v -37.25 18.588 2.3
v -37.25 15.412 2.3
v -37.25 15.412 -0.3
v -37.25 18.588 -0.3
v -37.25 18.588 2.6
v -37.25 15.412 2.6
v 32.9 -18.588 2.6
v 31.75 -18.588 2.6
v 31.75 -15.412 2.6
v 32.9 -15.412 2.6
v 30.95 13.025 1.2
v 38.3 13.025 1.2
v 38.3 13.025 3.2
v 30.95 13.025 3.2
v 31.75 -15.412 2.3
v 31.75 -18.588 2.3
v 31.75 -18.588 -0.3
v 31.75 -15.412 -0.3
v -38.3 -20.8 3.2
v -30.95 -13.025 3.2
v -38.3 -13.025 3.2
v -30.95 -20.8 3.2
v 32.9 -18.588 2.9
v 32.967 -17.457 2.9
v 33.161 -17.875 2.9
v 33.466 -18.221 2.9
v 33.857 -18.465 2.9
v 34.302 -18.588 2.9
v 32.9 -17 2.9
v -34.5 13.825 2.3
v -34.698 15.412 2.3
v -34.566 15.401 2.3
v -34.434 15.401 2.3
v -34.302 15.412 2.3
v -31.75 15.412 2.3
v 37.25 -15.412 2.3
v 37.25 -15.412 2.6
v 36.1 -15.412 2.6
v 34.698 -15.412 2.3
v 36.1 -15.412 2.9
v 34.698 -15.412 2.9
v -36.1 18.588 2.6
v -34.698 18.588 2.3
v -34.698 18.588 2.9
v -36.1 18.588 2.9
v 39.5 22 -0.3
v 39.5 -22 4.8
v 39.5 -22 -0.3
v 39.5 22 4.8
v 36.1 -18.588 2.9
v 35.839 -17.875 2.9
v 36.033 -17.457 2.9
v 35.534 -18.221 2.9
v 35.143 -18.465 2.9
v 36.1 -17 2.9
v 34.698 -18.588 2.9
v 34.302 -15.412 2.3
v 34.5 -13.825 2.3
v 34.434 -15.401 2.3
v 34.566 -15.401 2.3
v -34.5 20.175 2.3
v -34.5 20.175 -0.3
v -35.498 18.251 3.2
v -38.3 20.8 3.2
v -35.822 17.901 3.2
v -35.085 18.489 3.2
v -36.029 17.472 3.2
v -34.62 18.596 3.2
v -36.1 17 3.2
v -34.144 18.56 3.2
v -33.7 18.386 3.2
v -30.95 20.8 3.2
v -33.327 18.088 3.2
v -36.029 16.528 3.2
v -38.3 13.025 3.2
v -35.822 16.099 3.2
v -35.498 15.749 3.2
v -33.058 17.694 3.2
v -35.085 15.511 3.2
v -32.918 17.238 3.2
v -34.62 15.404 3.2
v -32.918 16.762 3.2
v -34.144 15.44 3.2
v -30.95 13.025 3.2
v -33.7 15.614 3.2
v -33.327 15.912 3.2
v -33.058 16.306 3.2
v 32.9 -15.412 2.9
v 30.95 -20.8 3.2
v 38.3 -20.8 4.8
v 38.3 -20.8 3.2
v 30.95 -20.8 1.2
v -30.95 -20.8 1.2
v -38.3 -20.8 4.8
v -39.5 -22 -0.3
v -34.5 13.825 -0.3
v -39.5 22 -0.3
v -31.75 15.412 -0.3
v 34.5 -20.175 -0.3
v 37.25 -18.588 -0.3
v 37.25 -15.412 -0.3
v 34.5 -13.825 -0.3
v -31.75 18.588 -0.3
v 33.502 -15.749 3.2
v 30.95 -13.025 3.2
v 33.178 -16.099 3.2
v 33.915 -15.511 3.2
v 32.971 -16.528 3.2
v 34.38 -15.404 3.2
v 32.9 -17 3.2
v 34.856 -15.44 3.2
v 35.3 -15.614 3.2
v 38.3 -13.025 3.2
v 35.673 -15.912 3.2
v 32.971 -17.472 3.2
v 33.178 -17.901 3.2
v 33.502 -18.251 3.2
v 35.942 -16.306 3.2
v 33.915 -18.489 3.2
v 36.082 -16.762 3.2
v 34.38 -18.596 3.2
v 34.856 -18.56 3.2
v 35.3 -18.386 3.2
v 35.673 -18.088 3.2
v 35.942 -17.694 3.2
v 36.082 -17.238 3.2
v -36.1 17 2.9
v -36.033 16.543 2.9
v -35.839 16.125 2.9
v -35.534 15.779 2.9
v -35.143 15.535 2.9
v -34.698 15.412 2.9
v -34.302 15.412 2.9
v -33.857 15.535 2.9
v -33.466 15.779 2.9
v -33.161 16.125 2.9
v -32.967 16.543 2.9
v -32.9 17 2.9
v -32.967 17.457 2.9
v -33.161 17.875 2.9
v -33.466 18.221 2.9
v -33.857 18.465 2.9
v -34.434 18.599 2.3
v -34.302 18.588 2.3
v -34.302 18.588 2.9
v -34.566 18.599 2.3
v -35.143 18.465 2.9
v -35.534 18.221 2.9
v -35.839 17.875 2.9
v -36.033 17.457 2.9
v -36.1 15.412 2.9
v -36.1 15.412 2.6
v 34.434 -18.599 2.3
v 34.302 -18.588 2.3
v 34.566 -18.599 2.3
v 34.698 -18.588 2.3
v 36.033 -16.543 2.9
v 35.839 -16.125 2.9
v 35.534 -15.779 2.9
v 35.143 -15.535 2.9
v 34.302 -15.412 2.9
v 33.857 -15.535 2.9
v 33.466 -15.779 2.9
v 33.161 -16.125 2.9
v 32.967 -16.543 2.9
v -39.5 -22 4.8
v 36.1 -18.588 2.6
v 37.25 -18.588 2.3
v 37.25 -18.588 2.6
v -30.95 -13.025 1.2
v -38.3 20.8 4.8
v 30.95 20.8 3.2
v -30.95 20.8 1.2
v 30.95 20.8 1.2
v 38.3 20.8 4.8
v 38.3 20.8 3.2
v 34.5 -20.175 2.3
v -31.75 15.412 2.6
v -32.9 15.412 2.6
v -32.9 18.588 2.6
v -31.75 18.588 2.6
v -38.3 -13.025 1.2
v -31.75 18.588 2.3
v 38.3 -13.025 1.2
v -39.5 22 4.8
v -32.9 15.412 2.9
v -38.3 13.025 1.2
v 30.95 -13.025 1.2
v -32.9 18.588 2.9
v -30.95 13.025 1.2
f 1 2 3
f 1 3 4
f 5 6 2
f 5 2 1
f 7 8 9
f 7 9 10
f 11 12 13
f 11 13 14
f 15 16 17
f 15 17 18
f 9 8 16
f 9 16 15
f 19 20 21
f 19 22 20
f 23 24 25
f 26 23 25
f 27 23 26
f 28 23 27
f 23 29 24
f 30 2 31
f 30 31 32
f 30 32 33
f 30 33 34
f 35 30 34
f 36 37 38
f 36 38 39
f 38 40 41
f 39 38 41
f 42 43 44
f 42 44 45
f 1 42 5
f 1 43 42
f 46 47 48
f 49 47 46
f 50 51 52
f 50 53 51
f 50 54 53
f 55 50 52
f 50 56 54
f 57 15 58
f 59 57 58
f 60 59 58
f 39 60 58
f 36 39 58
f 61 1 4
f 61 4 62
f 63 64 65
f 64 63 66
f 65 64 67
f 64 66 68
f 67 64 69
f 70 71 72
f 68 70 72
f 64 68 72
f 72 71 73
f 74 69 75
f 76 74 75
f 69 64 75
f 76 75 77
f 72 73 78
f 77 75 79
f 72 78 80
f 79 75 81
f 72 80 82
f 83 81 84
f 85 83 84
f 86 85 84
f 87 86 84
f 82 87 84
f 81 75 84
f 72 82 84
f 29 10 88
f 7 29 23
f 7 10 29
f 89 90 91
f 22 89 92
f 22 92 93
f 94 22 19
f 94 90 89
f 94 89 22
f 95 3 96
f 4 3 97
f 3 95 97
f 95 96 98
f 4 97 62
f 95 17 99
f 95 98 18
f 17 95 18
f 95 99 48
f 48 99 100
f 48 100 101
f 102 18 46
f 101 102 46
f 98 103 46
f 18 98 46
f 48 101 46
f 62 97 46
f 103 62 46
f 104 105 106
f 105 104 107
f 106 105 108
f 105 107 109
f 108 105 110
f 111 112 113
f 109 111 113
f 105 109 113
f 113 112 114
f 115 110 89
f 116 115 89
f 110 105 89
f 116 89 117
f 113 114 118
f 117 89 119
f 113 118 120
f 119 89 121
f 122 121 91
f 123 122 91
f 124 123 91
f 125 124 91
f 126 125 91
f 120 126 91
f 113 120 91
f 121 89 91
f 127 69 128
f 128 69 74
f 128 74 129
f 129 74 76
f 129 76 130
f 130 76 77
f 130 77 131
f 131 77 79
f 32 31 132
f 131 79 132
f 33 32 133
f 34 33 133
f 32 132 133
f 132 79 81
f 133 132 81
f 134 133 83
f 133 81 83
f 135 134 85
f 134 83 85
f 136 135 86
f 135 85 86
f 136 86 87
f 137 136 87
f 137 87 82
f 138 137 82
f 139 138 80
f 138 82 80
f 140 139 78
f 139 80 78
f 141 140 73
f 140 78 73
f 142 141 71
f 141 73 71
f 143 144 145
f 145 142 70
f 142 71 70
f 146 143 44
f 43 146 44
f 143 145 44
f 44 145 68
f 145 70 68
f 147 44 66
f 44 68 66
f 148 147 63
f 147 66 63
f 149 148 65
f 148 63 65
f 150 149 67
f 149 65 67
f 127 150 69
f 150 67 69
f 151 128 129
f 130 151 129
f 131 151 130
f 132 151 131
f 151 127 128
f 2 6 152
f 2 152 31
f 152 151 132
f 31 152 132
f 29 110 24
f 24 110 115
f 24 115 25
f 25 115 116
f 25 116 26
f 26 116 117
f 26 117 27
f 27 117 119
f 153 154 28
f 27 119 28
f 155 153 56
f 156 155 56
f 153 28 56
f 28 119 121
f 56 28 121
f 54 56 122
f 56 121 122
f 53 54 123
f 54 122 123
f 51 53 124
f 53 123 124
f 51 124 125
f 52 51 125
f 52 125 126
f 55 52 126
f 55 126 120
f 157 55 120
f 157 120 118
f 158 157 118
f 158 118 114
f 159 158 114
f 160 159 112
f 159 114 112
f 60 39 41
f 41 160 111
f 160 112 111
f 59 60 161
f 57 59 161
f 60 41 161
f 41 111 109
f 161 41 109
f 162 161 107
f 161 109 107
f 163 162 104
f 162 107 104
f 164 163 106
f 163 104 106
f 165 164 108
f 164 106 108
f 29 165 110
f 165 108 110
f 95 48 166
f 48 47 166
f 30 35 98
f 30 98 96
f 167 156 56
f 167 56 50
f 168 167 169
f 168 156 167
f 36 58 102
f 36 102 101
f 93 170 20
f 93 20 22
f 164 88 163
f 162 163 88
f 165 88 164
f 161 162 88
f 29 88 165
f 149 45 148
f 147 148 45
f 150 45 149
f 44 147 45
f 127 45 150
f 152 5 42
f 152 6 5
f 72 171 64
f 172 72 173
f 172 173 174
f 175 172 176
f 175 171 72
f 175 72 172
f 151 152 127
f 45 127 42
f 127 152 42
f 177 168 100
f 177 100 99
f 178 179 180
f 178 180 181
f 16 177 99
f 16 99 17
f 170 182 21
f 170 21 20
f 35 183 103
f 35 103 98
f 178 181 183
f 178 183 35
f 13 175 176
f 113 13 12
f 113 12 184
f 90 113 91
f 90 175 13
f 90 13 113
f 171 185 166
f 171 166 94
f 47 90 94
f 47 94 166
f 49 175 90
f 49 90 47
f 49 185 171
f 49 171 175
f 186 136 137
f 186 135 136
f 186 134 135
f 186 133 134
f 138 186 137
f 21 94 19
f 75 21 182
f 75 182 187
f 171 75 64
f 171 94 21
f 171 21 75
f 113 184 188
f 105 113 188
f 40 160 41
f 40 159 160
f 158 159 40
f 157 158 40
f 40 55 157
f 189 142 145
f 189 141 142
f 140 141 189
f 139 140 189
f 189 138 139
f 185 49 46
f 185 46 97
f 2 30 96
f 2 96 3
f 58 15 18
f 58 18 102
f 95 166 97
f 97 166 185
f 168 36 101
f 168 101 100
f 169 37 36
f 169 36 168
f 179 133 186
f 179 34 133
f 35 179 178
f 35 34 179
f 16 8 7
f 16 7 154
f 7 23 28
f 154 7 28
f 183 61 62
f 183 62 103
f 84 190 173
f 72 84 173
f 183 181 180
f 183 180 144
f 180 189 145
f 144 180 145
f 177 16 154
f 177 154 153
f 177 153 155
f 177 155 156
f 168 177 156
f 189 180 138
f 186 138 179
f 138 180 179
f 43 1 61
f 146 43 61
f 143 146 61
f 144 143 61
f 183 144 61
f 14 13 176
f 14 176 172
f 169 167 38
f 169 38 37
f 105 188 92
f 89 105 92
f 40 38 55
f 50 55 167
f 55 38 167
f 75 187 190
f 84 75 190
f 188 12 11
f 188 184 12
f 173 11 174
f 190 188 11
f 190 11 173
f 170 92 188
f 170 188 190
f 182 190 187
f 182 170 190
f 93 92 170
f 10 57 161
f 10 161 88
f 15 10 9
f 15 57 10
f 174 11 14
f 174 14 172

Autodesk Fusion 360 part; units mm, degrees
sketch "Sketch1" plane through (0, 0, 0) normal (0, 0, 1) x (1, 0, 0)
  line L0 (-39.5, 22) -> (39.5, 22)
  line L1 (39.5, 22) -> (39.5, -22)
  line L2 (39.5, -22) -> (-39.5, -22)
  line L3 (-39.5, -22) -> (-39.5, 22)
  dimension "d1" = 79
  dimension "d2" = 44
  dimension "d3" = 39.5
  dimension "d4" = 22
extrude "Extrude1" add sketch "Sketch1" along normal blind 4.8
sketch "Sketch2" plane through (0, 0, 4.8) normal (0, 0, 1) x (-1, 0, 0)
  line L0 (39.5, 22) -> (-39.5, 22)
  line L1 (-39.5, 22) -> (-39.5, -22)
  line L2 (-39.5, -22) -> (39.5, -22)
  line L3 (39.5, -22) -> (39.5, 22)
  line L4 (38.3, -20.8) -> (-38.3, -20.8)
  line L5 (-38.3, -20.8) -> (-38.3, 20.8)
  line L6 (-38.3, 20.8) -> (38.3, 20.8)
  line L7 (38.3, 20.8) -> (38.3, -20.8)
  dimension "d7" = 76.6
  dimension "d8" = 41.6
  dimension "d9" = 1.2
  dimension "d10" = 1.2
extrude "Extrude2" cut sketch "Sketch2" against normal blind 3.6 contours L4 L5 L6 L7
sketch "Sketch3" plane through (0, 0, 1.2) normal (0, 0, 1) x (-1, 0, 0)
  line L0 (38.3, 20.8) -> (-38.3, 20.8)
  line L1 (-38.3, 20.8) -> (-38.3, -20.8)
  line L2 (-38.3, -20.8) -> (38.3, -20.8)
  line L3 (38.3, -20.8) -> (38.3, 20.8)
  circle A0 centre (-32.9, -15.4) radius 3.25
  line L4 (39.5, -22) -> (-39.5, -22)
  line L5 (-39.5, -22) -> (-39.5, 22)
  line L6 (39.5, 22) -> (39.5, -22)
  line L7 (-39.5, 22) -> (39.5, 22)
  circle A1 centre (32.9, 15.4) radius 3.25
  line L8 (39.5, 22) -> (39.5, -22)
  line L9 (-39.5, 22) -> (39.5, 22)
  dimension "d13" = 6.5
  dimension "d14" = 6.6
  dimension "d15" = 6.6
  dimension "d29" = 6.5
  dimension "d30" = 6.6
  dimension "d31" = 6.6
sketch "Sketch5" plane through (0, 0, 1.2) normal (0, 0, 1) x (1, 0, 0)
extrude "Extrude4" add sketch "Sketch3" along normal blind 2 contours A1
extrude "Extrude5" cut 1 faces at (-34.1709, -16.2087, 3.2) along direction (0, 0, -1) blind 2
sketch "Sketch6" plane through (0, 0, 0) normal (0, 0, -1) x (1, 0, 0)
  line L0 (39.5, 22) -> (-39.5, 22)
  line L1 (-39.5, 22) -> (-39.5, -22)
  line L2 (-39.5, -22) -> (39.5, -22)
  line L3 (39.5, -22) -> (39.5, 22)
  line L4 (-31.75, 15.4123) -> (-31.75, 18.5877)
  line L5 (-31.75, 18.5877) -> (-34.5, 20.1754)
  line L6 (-34.5, 20.1754) -> (-37.25, 18.5877)
  line L7 (-37.25, 18.5877) -> (-37.25, 15.4123)
  line L8 (-37.25, 15.4123) -> (-34.5, 13.8246)
  line L9 (-34.5, 13.8246) -> (-31.75, 15.4123)
  line L10 (-31.35, 22) -> (-31.35, 13.4246)
  line L11 (-31.35, 13.4246) -> (-39.5, 13.4246)
  point P0 (-34.5, 17)
  dimension "d36" = 2.75
  dimension "d37" = 5
  dimension "d38" = 5
  dimension "d50" = 0.4
  dimension "d51" = 0.4
sketch "Sketch9" plane through (0, 0, 0) normal (0, 0, -1) x (1, 0, 0)
  line L0 (-37.25, -15.4123) -> (-37.25, -18.5877)
  line L1 (-37.25, -18.5877) -> (-34.5, -20.1754)
  line L2 (-34.5, -20.1754) -> (-31.75, -18.5877)
  line L3 (-31.75, -18.5877) -> (-31.75, -15.4123)
  line L4 (-31.75, -15.4123) -> (-34.5, -13.8246)
  line L5 (-34.5, -13.8246) -> (-37.25, -15.4123)
  line L6 (-39.5, 22) -> (-39.5, -22)
  line L7 (-39.5, -22) -> (39.5, -22)
  line L8 (-39.5, -13.0246) -> (-30.95, -13.0246)
  line L9 (-30.95, -13.0246) -> (-30.95, -22)
  point P0 (-34.5, -17)
  dimension "d61" = 2.75
  dimension "d62" = 5
  dimension "d63" = 5
  dimension "d64" = 0.8
  dimension "d65" = 0.8
extrude "Extrude11" add sketch "Sketch9" against normal blind 3.2 contours L0 L1 L2 L3 L4 L5 | L6 L7 L8 L9
extrude "Extrude12" cut sketch "Sketch9" against normal blind 2.4 contours L0 L1 L2 L3 L4 L5
sketch "Sketch10" plane through (0, 0, 3.2) normal (0, 0, 1) x (-1, 0, 0)
  line L0 (38.3, -20.8) -> (38.3, -13.0246)
  line L1 (38.3, -13.0246) -> (30.95, -13.0246)
  line L2 (30.95, -13.0246) -> (30.95, -20.8)
  line L3 (30.95, -20.8) -> (38.3, -20.8)
  circle A0 centre (34.5, -17) radius 1.6
  line L4 (39.5, 22) -> (39.5, -22)
  line L5 (39.5, -22) -> (-39.5, -22)
  dimension "d70" = 3.2
  dimension "d71" = 5
  dimension "d72" = 5
extrude "Extrude13" cut sketch "Sketch10" against normal blind 3.2 contours A0
sketch "Sketch11" plane through (0, 0, 0) normal (0, 0, -1) x (1, 0, 0)
  line L0 (37.25, 15.4123) -> (37.25, 18.5877)
  line L1 (37.25, 18.5877) -> (34.5, 20.1754)
  line L2 (34.5, 20.1754) -> (31.75, 18.5877)
  line L3 (31.75, 18.5877) -> (31.75, 15.4123)
  line L4 (31.75, 15.4123) -> (34.5, 13.8246)
  line L5 (34.5, 13.8246) -> (37.25, 15.4123)
  line L6 (39.5, -22) -> (39.5, 22)
  line L7 (39.5, 22) -> (-39.5, 22)
  line L8 (39.5, 13.0246) -> (30.95, 13.0246)
  line L9 (30.95, 13.0246) -> (30.95, 22)
  point P0 (34.5, 17)
  dimension "d75" = 2.75
  dimension "d76" = 5
  dimension "d77" = 5
  dimension "d78" = 0.8
  dimension "d79" = 0.8
extrude "Extrude14" add sketch "Sketch11" against normal blind 3.2 contours L0 L1 L2 L3 L4 L5 | L6 L7 L8 L9
extrude "Extrude15" cut sketch "Sketch11" against normal blind 2.4 contours L0 L1 L2 L3 L4 L5
sketch "Sketch12" plane through (0, 0, 3.2) normal (0, 0, 1) x (-1, 0, 0)
  line L0 (-38.3, 20.8) -> (-38.3, 13.0246)
  line L1 (-38.3, 13.0246) -> (-30.95, 13.0246)
  line L2 (-30.95, 13.0246) -> (-30.95, 20.8)
  line L3 (-30.95, 20.8) -> (-38.3, 20.8)
  circle A0 centre (-34.5, 17) radius 1.6
  line L4 (-39.5, -22) -> (-39.5, 22)
  line L5 (-39.5, 22) -> (39.5, 22)
  dimension "d84" = 3.2
  dimension "d85" = 5
  dimension "d86" = 5
extrude "Extrude16" cut sketch "Sketch12" against normal blind 3.2 contours A0
sketch "Sketch14" plane through (0, 0, 2.4) normal (0, 0, -1) x (1, 0, 0)
  circle A0 centre (-34.5, -17) radius 1.6
  line L0 (-34.5, -13.8246) -> (-37.25, -15.4123)
  line L1 (-37.25, -15.4123) -> (-37.25, -18.5877)
  line L2 (-37.25, -18.5877) -> (-34.5, -20.1754)
  line L3 (-34.5, -20.1754) -> (-31.75, -18.5877)
  line L4 (-31.75, -18.5877) -> (-31.75, -15.4123)
  line L5 (-31.75, -15.4123) -> (-34.5, -13.8246)
  line L6 (-37.25, -15.4123) -> (-31.75, -15.4123)
  line L7 (-31.75, -18.5877) -> (-37.25, -18.5877)
  line L8 (-36.1, -15.4123) -> (-36.1, -18.5877)
  line L9 (-32.9, -18.5877) -> (-32.9, -15.4123)
sketch "Sketch15" plane through (0, 0, 2.4) normal (0, 0, -1) x (1, 0, 0)
  circle A0 centre (34.5, 17) radius 1.6
  line L0 (34.5, 13.8246) -> (37.25, 15.4123)
  line L1 (37.25, 15.4123) -> (37.25, 18.5877)
  line L2 (37.25, 18.5877) -> (34.5, 20.1754)
  line L3 (34.5, 20.1754) -> (31.75, 18.5877)
  line L4 (31.75, 18.5877) -> (31.75, 15.4123)
  line L5 (31.75, 15.4123) -> (34.5, 13.8246)
  line L6 (31.75, 18.5877) -> (37.25, 18.5877)
  line L7 (37.25, 15.4123) -> (31.75, 15.4123)
  line L8 (32.9, 15.4123) -> (32.9, 18.5877)
  line L9 (36.1, 15.4123) -> (36.1, 18.5877)
extrude "Extrude17" cut sketch "Sketch14" sketch "Sketch15" against normal blind 0.5 contours A0 L7 L9 | A0 L6 L9 | A0 L6 L8 | A0 L7 L8 of sketch 2 contours A0 L7 L9 | A0 L6 L9 | A0 L6 L8 | A0 L7 L8
extrude "Extrude18" cut sketch "Sketch14" sketch "Sketch15" against normal blind 0.2 contours L4 L6 L7 L9 | L1 L6 L7 L8 of sketch 2 contours L1 L6 L7 L9 | L4 L6 L7 L8
extrude "Extrude19" add 4 faces at (35.4826, -19.117, 2.4) (35.4826, -14.883, 2.4) (-33.5174, 14.883, 2.4) (-33.5174, 19.117, 2.4) along direction (0, 0, -1) blind 0.1
sketch "Sketch16" plane through (0, 0, 1.2) normal (0, 0, 1) x (-1, 0, 0)
  line L0 (-30.95, 13.0246) -> (-38.3, 13.0246)
  line L1 (-38.3, 13.0246) -> (-38.3, -20.8)
  line L2 (-38.3, -20.8) -> (30.95, -20.8)
  line L3 (30.95, -20.8) -> (30.95, -13.0246)
  line L4 (30.95, -13.0246) -> (38.3, -13.0246)
  line L5 (38.3, -13.0246) -> (38.3, 20.8)
  line L6 (38.3, 20.8) -> (-30.95, 20.8)
  line L7 (-30.95, 20.8) -> (-30.95, 13.0246)
  line L8 (-30.95, -20.8) -> (-38.3, -20.8)
  line L9 (-38.3, -20.8) -> (-38.3, -13.025)
  line L10 (-38.3, -13.025) -> (-30.95, -13.025)
  line L11 (-30.95, -13.025) -> (-30.95, -20.8)
  line L12 (38.3, 20.8) -> (38.3, 13.025)
  line L13 (38.3, 13.025) -> (30.95, 13.025)
  line L14 (30.95, 20.8) -> (38.3, 20.8)
  line L15 (30.95, 13.025) -> (30.95, 20.8)
  dimension "d95" = 7.35
  dimension "d96" = 7.775
  dimension "d97" = 7.35
  dimension "d98" = 7.775
extrude "Extrude20" add sketch "Sketch16" along normal blind 2 contours L1 L2 L8 L9 L10 L11 | L5 L6 L12 L13 L14 L15
extrude "Extrude21" add 1 faces at (-13.1667, -7.3333, 0) along direction (0, 0, -1) blind 0.3
